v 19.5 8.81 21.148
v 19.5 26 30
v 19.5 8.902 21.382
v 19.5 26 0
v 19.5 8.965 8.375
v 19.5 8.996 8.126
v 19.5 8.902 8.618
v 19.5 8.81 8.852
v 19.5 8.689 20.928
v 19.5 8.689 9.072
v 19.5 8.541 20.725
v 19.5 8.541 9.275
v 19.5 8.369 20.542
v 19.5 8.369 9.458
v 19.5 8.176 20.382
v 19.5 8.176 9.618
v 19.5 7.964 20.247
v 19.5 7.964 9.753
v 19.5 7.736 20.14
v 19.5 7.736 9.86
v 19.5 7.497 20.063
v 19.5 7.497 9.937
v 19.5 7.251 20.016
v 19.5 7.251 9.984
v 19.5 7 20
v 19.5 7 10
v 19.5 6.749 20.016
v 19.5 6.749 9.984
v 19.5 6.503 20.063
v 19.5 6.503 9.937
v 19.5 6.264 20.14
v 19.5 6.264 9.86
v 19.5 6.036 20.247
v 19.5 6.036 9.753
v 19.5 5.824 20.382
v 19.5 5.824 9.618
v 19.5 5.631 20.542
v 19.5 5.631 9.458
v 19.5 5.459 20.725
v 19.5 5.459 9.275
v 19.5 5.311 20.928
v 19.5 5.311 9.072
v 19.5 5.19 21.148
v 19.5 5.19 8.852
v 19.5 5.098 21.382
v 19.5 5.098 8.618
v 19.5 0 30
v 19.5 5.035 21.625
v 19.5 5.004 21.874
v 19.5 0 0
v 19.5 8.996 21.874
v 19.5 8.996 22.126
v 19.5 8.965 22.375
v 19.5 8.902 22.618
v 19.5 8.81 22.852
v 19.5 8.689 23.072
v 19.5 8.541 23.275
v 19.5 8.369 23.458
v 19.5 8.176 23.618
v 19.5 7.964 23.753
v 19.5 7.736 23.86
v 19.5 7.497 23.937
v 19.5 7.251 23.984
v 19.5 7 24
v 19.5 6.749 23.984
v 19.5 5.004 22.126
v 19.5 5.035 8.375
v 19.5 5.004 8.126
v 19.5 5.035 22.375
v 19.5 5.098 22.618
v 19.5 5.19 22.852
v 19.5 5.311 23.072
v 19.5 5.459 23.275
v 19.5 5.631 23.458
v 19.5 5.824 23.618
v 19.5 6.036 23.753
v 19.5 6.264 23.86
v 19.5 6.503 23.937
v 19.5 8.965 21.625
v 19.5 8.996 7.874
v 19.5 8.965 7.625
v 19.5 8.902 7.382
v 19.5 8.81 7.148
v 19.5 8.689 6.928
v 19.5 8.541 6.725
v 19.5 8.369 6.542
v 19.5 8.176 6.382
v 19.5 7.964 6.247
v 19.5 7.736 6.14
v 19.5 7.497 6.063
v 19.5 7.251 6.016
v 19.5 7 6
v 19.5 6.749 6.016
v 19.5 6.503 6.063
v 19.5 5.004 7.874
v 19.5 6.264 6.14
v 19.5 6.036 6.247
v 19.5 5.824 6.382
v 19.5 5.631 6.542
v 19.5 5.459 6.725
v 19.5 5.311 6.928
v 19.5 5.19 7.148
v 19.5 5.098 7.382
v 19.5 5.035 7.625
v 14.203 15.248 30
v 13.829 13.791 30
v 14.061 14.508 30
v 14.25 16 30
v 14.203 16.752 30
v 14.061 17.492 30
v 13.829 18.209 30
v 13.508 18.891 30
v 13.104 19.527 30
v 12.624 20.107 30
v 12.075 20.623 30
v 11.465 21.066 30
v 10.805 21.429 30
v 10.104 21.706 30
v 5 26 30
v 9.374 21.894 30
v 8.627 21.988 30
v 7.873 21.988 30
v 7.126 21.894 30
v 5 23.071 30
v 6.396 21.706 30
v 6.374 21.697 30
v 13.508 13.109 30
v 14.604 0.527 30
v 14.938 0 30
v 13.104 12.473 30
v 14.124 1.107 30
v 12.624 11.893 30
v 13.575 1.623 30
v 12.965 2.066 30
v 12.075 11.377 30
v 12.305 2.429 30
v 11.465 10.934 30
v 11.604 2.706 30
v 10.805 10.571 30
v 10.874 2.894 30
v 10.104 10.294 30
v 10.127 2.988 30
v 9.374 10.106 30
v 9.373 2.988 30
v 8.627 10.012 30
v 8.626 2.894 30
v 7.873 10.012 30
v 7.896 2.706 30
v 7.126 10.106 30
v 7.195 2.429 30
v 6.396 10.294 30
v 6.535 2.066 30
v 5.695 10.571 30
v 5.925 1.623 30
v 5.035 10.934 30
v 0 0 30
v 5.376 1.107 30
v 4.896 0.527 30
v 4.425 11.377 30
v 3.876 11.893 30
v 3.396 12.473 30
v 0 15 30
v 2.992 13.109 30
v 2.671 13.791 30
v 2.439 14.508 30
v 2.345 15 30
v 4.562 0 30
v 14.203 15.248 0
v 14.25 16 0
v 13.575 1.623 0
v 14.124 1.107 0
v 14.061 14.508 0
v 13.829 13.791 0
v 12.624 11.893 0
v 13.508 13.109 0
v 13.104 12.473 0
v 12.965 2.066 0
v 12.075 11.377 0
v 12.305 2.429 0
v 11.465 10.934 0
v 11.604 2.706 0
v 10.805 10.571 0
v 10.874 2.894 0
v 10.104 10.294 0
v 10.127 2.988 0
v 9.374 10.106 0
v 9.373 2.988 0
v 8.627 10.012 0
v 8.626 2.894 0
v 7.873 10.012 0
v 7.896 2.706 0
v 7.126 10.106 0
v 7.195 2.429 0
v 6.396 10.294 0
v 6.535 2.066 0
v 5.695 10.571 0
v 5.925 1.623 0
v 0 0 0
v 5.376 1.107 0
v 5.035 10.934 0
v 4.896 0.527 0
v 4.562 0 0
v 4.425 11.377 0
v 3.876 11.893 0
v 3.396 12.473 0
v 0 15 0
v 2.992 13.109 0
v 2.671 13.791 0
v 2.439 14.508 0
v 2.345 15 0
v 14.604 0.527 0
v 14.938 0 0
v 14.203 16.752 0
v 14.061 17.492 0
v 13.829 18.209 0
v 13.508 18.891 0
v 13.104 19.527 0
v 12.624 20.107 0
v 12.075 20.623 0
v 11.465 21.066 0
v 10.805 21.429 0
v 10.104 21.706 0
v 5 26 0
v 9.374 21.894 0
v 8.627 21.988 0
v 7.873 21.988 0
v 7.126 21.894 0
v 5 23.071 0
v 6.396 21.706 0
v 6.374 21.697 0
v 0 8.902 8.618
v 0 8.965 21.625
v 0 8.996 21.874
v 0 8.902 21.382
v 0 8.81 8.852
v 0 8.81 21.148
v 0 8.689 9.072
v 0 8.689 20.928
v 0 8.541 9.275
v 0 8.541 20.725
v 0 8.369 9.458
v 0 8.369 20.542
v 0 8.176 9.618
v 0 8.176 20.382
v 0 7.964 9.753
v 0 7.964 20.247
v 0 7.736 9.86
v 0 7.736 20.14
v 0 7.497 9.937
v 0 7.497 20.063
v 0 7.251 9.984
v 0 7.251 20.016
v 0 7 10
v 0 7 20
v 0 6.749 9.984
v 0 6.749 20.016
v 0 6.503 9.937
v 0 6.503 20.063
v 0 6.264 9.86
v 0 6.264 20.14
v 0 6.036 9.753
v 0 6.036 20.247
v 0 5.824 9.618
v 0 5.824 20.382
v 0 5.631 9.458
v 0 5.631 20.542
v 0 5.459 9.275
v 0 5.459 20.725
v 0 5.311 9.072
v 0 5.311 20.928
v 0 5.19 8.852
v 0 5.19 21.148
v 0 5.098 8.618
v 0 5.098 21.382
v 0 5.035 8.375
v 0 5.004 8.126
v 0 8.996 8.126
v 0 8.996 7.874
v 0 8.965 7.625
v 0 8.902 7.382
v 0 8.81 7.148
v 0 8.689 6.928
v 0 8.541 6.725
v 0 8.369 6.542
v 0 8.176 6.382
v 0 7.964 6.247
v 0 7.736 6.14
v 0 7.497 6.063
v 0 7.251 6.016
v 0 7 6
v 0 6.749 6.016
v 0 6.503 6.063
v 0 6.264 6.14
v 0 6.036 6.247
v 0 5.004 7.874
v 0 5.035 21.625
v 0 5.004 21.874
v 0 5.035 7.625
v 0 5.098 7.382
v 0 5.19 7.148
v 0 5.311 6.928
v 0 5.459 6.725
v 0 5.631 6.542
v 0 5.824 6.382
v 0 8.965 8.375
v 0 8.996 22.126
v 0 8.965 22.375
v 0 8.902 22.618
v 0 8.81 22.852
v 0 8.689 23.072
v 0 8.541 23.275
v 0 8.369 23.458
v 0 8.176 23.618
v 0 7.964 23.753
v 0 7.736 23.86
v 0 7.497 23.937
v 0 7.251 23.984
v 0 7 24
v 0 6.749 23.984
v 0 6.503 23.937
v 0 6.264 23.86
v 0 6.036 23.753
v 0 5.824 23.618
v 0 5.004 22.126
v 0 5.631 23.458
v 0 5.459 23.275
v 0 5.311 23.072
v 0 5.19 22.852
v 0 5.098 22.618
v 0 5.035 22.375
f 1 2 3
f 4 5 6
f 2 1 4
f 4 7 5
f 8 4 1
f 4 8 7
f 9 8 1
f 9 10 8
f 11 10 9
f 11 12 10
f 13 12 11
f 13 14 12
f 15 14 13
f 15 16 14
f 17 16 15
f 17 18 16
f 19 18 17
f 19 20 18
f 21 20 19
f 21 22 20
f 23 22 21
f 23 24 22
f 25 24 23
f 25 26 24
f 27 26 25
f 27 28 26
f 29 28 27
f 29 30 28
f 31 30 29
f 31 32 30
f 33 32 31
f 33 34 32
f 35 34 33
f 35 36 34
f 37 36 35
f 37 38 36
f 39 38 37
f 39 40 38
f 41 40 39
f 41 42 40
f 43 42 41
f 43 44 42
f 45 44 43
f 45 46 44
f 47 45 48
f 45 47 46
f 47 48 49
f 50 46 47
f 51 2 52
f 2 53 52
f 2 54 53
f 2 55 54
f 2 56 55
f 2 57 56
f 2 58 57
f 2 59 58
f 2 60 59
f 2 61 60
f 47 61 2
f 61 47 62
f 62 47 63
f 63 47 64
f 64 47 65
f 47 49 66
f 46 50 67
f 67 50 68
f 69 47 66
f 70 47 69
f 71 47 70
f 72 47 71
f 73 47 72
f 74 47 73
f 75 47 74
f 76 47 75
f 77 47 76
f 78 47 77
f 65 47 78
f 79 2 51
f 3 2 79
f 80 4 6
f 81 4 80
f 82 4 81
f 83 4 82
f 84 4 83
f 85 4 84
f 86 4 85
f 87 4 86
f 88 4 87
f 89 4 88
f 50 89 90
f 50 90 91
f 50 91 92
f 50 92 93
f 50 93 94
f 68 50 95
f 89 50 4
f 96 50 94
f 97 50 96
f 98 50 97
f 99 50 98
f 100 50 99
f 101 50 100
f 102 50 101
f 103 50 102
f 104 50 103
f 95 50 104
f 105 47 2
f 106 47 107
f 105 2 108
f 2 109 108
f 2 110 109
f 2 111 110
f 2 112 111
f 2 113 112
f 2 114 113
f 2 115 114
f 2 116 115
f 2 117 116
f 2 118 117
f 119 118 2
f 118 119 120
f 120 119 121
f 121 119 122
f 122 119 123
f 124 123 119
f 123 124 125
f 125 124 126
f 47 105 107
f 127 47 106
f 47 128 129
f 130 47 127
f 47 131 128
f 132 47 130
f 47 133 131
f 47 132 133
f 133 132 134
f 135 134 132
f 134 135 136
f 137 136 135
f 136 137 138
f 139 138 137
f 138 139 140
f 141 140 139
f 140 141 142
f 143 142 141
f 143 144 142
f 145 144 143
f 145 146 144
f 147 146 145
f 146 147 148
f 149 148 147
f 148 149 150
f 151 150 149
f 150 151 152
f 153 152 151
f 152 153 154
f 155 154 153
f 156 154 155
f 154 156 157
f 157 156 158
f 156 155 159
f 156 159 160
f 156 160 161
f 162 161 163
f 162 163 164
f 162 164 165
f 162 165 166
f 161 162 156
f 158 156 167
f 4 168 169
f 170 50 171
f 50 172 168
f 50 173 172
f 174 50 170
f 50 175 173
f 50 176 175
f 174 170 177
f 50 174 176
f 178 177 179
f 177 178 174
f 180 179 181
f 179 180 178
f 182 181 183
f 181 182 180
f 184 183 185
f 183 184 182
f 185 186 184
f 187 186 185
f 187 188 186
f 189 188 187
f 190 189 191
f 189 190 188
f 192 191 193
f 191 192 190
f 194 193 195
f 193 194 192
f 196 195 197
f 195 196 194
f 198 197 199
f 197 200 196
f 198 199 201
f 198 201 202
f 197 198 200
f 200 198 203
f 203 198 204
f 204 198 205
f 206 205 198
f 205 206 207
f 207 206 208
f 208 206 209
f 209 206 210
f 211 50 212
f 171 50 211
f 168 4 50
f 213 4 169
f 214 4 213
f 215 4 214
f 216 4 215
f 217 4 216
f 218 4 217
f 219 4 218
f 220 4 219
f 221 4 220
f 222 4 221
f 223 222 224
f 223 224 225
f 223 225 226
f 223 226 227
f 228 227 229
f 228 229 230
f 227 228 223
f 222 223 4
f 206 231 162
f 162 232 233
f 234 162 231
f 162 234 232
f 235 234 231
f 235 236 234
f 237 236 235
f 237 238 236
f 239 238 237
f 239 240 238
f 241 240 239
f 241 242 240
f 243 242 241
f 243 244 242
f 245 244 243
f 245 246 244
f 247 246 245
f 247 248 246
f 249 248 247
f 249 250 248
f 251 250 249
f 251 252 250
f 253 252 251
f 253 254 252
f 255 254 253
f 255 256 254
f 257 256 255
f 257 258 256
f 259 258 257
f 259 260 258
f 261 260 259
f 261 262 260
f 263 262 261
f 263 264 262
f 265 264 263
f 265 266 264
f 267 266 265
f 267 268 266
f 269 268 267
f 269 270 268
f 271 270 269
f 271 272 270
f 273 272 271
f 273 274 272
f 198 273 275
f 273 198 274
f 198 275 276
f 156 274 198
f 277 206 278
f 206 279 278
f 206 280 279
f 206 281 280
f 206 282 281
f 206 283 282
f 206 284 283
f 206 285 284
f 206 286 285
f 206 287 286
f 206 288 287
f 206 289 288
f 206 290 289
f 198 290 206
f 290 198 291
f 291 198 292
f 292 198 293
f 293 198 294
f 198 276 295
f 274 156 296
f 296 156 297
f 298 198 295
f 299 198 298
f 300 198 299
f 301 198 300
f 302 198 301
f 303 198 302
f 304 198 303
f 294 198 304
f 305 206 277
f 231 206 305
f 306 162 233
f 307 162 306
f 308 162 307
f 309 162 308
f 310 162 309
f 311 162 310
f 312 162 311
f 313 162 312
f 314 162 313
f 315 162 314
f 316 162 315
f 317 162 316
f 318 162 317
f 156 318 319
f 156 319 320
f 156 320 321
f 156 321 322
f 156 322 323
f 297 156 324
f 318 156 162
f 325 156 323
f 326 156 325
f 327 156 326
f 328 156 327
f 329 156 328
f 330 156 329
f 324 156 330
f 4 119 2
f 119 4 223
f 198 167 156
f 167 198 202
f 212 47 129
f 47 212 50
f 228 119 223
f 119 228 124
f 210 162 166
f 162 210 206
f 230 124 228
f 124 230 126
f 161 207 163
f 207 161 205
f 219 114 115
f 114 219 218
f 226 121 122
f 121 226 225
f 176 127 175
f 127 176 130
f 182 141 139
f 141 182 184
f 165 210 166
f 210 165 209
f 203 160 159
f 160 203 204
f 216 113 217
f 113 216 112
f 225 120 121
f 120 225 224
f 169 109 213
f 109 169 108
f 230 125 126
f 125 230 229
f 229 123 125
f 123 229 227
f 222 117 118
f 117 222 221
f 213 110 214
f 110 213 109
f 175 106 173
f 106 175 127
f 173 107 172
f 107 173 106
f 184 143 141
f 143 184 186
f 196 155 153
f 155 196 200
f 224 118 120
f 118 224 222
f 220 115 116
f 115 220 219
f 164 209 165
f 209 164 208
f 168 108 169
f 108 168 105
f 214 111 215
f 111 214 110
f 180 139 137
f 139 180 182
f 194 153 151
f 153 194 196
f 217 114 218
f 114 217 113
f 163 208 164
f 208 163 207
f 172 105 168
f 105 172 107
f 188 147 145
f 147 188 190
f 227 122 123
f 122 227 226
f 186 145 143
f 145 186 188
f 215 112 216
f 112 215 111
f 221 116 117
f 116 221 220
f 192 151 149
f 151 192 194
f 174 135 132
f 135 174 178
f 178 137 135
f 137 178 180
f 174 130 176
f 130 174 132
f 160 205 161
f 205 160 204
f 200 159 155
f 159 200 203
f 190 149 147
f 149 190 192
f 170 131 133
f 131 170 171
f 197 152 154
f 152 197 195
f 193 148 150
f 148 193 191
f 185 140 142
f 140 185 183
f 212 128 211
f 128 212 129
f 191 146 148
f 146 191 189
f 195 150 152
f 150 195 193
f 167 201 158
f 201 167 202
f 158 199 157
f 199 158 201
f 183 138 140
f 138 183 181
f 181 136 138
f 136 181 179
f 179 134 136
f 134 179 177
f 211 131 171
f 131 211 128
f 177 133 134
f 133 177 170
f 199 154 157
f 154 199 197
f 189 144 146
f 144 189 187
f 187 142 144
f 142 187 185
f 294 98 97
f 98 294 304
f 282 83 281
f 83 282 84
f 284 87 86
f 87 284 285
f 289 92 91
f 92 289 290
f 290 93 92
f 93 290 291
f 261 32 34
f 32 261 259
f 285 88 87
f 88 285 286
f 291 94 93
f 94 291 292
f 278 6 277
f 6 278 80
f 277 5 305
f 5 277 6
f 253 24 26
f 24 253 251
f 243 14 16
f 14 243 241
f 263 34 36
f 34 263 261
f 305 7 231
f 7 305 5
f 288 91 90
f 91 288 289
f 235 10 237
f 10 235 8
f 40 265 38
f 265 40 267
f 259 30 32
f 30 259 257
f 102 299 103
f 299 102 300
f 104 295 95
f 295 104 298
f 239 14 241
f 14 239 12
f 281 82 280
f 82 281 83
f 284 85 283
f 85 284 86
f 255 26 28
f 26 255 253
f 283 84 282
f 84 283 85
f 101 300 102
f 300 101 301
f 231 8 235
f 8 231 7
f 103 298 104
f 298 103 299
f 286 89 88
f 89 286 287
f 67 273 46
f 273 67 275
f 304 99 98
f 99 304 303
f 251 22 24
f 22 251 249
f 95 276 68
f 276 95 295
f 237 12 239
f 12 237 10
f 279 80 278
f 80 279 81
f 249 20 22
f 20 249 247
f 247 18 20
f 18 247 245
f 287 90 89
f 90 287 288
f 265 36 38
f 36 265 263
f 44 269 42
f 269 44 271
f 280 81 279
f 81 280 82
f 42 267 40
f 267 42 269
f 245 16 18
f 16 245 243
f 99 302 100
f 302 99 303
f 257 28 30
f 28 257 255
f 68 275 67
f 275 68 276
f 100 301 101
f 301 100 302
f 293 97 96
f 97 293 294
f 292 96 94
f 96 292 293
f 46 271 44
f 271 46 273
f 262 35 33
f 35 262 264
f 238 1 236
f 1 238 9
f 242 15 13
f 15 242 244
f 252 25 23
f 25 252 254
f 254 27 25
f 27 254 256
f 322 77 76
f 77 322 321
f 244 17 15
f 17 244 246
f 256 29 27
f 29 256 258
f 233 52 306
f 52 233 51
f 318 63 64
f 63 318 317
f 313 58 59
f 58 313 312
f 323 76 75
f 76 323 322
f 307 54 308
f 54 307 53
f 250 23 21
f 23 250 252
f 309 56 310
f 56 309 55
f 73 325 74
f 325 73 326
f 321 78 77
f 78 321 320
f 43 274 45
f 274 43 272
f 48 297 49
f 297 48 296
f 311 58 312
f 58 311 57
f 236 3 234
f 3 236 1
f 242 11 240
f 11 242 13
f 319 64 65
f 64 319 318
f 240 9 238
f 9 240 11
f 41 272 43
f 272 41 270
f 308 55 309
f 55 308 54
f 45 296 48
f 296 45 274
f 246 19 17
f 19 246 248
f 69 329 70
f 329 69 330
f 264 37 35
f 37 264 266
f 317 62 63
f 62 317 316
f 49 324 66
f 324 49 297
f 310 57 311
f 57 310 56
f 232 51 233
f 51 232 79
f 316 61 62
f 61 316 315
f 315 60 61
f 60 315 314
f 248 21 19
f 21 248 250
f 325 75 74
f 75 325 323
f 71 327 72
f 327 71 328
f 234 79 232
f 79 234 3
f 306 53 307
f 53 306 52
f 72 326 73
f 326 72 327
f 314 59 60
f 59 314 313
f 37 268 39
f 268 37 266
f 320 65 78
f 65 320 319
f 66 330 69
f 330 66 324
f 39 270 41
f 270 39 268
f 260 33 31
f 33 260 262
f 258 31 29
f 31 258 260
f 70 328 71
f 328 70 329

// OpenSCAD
r_arbre=6;
l_bloc=26;
ep_bloc_base=16.5;
r_m3_for=1.4;
r_m3=2;
r_ecrou_m3=3.3;
pos_vis=19;
hauteur=30;
entraxe=74;
nema=35;
r_centre=12;
dec=4.5;
longueur=29;
ep=3;
hauteurf=8;
r_rond=9;

module bloc_profile(){
	difference(){
	union()
		cube([ep_bloc_base+3,l_bloc,hauteur]);

		//petite extrusion pour passage à l'intérieur du profilé
		translate([-5,15,-5]){cube([10,25,hauteur+10]);}
		translate([5,16,-5]){rotate([0,0,45])cube([5,6,hauteur+10]);}

		//trou général sur le profilé
		translate([ep_bloc_base/2,16,-5]){cylinder(h=hauteur+10, r=r_arbre, $fn=50);}

		//arrondi pour placement spirale
		translate([(ep_bloc_base+3)/2,-3,-5]){cylinder(h=hauteur+10, r=6, $fn=50);}
		
		//trou pour passer les colliers
		translate([-5,7,hauteur/2-7]){rotate([0,90,0])cylinder(h=25, r=r_m3, $fn=50);}
		translate([-5,7,hauteur/2+7]){rotate([0,90,0])cylinder(h=25, r=r_m3, $fn=50);}
	
	}
	
}

bloc_profile();
